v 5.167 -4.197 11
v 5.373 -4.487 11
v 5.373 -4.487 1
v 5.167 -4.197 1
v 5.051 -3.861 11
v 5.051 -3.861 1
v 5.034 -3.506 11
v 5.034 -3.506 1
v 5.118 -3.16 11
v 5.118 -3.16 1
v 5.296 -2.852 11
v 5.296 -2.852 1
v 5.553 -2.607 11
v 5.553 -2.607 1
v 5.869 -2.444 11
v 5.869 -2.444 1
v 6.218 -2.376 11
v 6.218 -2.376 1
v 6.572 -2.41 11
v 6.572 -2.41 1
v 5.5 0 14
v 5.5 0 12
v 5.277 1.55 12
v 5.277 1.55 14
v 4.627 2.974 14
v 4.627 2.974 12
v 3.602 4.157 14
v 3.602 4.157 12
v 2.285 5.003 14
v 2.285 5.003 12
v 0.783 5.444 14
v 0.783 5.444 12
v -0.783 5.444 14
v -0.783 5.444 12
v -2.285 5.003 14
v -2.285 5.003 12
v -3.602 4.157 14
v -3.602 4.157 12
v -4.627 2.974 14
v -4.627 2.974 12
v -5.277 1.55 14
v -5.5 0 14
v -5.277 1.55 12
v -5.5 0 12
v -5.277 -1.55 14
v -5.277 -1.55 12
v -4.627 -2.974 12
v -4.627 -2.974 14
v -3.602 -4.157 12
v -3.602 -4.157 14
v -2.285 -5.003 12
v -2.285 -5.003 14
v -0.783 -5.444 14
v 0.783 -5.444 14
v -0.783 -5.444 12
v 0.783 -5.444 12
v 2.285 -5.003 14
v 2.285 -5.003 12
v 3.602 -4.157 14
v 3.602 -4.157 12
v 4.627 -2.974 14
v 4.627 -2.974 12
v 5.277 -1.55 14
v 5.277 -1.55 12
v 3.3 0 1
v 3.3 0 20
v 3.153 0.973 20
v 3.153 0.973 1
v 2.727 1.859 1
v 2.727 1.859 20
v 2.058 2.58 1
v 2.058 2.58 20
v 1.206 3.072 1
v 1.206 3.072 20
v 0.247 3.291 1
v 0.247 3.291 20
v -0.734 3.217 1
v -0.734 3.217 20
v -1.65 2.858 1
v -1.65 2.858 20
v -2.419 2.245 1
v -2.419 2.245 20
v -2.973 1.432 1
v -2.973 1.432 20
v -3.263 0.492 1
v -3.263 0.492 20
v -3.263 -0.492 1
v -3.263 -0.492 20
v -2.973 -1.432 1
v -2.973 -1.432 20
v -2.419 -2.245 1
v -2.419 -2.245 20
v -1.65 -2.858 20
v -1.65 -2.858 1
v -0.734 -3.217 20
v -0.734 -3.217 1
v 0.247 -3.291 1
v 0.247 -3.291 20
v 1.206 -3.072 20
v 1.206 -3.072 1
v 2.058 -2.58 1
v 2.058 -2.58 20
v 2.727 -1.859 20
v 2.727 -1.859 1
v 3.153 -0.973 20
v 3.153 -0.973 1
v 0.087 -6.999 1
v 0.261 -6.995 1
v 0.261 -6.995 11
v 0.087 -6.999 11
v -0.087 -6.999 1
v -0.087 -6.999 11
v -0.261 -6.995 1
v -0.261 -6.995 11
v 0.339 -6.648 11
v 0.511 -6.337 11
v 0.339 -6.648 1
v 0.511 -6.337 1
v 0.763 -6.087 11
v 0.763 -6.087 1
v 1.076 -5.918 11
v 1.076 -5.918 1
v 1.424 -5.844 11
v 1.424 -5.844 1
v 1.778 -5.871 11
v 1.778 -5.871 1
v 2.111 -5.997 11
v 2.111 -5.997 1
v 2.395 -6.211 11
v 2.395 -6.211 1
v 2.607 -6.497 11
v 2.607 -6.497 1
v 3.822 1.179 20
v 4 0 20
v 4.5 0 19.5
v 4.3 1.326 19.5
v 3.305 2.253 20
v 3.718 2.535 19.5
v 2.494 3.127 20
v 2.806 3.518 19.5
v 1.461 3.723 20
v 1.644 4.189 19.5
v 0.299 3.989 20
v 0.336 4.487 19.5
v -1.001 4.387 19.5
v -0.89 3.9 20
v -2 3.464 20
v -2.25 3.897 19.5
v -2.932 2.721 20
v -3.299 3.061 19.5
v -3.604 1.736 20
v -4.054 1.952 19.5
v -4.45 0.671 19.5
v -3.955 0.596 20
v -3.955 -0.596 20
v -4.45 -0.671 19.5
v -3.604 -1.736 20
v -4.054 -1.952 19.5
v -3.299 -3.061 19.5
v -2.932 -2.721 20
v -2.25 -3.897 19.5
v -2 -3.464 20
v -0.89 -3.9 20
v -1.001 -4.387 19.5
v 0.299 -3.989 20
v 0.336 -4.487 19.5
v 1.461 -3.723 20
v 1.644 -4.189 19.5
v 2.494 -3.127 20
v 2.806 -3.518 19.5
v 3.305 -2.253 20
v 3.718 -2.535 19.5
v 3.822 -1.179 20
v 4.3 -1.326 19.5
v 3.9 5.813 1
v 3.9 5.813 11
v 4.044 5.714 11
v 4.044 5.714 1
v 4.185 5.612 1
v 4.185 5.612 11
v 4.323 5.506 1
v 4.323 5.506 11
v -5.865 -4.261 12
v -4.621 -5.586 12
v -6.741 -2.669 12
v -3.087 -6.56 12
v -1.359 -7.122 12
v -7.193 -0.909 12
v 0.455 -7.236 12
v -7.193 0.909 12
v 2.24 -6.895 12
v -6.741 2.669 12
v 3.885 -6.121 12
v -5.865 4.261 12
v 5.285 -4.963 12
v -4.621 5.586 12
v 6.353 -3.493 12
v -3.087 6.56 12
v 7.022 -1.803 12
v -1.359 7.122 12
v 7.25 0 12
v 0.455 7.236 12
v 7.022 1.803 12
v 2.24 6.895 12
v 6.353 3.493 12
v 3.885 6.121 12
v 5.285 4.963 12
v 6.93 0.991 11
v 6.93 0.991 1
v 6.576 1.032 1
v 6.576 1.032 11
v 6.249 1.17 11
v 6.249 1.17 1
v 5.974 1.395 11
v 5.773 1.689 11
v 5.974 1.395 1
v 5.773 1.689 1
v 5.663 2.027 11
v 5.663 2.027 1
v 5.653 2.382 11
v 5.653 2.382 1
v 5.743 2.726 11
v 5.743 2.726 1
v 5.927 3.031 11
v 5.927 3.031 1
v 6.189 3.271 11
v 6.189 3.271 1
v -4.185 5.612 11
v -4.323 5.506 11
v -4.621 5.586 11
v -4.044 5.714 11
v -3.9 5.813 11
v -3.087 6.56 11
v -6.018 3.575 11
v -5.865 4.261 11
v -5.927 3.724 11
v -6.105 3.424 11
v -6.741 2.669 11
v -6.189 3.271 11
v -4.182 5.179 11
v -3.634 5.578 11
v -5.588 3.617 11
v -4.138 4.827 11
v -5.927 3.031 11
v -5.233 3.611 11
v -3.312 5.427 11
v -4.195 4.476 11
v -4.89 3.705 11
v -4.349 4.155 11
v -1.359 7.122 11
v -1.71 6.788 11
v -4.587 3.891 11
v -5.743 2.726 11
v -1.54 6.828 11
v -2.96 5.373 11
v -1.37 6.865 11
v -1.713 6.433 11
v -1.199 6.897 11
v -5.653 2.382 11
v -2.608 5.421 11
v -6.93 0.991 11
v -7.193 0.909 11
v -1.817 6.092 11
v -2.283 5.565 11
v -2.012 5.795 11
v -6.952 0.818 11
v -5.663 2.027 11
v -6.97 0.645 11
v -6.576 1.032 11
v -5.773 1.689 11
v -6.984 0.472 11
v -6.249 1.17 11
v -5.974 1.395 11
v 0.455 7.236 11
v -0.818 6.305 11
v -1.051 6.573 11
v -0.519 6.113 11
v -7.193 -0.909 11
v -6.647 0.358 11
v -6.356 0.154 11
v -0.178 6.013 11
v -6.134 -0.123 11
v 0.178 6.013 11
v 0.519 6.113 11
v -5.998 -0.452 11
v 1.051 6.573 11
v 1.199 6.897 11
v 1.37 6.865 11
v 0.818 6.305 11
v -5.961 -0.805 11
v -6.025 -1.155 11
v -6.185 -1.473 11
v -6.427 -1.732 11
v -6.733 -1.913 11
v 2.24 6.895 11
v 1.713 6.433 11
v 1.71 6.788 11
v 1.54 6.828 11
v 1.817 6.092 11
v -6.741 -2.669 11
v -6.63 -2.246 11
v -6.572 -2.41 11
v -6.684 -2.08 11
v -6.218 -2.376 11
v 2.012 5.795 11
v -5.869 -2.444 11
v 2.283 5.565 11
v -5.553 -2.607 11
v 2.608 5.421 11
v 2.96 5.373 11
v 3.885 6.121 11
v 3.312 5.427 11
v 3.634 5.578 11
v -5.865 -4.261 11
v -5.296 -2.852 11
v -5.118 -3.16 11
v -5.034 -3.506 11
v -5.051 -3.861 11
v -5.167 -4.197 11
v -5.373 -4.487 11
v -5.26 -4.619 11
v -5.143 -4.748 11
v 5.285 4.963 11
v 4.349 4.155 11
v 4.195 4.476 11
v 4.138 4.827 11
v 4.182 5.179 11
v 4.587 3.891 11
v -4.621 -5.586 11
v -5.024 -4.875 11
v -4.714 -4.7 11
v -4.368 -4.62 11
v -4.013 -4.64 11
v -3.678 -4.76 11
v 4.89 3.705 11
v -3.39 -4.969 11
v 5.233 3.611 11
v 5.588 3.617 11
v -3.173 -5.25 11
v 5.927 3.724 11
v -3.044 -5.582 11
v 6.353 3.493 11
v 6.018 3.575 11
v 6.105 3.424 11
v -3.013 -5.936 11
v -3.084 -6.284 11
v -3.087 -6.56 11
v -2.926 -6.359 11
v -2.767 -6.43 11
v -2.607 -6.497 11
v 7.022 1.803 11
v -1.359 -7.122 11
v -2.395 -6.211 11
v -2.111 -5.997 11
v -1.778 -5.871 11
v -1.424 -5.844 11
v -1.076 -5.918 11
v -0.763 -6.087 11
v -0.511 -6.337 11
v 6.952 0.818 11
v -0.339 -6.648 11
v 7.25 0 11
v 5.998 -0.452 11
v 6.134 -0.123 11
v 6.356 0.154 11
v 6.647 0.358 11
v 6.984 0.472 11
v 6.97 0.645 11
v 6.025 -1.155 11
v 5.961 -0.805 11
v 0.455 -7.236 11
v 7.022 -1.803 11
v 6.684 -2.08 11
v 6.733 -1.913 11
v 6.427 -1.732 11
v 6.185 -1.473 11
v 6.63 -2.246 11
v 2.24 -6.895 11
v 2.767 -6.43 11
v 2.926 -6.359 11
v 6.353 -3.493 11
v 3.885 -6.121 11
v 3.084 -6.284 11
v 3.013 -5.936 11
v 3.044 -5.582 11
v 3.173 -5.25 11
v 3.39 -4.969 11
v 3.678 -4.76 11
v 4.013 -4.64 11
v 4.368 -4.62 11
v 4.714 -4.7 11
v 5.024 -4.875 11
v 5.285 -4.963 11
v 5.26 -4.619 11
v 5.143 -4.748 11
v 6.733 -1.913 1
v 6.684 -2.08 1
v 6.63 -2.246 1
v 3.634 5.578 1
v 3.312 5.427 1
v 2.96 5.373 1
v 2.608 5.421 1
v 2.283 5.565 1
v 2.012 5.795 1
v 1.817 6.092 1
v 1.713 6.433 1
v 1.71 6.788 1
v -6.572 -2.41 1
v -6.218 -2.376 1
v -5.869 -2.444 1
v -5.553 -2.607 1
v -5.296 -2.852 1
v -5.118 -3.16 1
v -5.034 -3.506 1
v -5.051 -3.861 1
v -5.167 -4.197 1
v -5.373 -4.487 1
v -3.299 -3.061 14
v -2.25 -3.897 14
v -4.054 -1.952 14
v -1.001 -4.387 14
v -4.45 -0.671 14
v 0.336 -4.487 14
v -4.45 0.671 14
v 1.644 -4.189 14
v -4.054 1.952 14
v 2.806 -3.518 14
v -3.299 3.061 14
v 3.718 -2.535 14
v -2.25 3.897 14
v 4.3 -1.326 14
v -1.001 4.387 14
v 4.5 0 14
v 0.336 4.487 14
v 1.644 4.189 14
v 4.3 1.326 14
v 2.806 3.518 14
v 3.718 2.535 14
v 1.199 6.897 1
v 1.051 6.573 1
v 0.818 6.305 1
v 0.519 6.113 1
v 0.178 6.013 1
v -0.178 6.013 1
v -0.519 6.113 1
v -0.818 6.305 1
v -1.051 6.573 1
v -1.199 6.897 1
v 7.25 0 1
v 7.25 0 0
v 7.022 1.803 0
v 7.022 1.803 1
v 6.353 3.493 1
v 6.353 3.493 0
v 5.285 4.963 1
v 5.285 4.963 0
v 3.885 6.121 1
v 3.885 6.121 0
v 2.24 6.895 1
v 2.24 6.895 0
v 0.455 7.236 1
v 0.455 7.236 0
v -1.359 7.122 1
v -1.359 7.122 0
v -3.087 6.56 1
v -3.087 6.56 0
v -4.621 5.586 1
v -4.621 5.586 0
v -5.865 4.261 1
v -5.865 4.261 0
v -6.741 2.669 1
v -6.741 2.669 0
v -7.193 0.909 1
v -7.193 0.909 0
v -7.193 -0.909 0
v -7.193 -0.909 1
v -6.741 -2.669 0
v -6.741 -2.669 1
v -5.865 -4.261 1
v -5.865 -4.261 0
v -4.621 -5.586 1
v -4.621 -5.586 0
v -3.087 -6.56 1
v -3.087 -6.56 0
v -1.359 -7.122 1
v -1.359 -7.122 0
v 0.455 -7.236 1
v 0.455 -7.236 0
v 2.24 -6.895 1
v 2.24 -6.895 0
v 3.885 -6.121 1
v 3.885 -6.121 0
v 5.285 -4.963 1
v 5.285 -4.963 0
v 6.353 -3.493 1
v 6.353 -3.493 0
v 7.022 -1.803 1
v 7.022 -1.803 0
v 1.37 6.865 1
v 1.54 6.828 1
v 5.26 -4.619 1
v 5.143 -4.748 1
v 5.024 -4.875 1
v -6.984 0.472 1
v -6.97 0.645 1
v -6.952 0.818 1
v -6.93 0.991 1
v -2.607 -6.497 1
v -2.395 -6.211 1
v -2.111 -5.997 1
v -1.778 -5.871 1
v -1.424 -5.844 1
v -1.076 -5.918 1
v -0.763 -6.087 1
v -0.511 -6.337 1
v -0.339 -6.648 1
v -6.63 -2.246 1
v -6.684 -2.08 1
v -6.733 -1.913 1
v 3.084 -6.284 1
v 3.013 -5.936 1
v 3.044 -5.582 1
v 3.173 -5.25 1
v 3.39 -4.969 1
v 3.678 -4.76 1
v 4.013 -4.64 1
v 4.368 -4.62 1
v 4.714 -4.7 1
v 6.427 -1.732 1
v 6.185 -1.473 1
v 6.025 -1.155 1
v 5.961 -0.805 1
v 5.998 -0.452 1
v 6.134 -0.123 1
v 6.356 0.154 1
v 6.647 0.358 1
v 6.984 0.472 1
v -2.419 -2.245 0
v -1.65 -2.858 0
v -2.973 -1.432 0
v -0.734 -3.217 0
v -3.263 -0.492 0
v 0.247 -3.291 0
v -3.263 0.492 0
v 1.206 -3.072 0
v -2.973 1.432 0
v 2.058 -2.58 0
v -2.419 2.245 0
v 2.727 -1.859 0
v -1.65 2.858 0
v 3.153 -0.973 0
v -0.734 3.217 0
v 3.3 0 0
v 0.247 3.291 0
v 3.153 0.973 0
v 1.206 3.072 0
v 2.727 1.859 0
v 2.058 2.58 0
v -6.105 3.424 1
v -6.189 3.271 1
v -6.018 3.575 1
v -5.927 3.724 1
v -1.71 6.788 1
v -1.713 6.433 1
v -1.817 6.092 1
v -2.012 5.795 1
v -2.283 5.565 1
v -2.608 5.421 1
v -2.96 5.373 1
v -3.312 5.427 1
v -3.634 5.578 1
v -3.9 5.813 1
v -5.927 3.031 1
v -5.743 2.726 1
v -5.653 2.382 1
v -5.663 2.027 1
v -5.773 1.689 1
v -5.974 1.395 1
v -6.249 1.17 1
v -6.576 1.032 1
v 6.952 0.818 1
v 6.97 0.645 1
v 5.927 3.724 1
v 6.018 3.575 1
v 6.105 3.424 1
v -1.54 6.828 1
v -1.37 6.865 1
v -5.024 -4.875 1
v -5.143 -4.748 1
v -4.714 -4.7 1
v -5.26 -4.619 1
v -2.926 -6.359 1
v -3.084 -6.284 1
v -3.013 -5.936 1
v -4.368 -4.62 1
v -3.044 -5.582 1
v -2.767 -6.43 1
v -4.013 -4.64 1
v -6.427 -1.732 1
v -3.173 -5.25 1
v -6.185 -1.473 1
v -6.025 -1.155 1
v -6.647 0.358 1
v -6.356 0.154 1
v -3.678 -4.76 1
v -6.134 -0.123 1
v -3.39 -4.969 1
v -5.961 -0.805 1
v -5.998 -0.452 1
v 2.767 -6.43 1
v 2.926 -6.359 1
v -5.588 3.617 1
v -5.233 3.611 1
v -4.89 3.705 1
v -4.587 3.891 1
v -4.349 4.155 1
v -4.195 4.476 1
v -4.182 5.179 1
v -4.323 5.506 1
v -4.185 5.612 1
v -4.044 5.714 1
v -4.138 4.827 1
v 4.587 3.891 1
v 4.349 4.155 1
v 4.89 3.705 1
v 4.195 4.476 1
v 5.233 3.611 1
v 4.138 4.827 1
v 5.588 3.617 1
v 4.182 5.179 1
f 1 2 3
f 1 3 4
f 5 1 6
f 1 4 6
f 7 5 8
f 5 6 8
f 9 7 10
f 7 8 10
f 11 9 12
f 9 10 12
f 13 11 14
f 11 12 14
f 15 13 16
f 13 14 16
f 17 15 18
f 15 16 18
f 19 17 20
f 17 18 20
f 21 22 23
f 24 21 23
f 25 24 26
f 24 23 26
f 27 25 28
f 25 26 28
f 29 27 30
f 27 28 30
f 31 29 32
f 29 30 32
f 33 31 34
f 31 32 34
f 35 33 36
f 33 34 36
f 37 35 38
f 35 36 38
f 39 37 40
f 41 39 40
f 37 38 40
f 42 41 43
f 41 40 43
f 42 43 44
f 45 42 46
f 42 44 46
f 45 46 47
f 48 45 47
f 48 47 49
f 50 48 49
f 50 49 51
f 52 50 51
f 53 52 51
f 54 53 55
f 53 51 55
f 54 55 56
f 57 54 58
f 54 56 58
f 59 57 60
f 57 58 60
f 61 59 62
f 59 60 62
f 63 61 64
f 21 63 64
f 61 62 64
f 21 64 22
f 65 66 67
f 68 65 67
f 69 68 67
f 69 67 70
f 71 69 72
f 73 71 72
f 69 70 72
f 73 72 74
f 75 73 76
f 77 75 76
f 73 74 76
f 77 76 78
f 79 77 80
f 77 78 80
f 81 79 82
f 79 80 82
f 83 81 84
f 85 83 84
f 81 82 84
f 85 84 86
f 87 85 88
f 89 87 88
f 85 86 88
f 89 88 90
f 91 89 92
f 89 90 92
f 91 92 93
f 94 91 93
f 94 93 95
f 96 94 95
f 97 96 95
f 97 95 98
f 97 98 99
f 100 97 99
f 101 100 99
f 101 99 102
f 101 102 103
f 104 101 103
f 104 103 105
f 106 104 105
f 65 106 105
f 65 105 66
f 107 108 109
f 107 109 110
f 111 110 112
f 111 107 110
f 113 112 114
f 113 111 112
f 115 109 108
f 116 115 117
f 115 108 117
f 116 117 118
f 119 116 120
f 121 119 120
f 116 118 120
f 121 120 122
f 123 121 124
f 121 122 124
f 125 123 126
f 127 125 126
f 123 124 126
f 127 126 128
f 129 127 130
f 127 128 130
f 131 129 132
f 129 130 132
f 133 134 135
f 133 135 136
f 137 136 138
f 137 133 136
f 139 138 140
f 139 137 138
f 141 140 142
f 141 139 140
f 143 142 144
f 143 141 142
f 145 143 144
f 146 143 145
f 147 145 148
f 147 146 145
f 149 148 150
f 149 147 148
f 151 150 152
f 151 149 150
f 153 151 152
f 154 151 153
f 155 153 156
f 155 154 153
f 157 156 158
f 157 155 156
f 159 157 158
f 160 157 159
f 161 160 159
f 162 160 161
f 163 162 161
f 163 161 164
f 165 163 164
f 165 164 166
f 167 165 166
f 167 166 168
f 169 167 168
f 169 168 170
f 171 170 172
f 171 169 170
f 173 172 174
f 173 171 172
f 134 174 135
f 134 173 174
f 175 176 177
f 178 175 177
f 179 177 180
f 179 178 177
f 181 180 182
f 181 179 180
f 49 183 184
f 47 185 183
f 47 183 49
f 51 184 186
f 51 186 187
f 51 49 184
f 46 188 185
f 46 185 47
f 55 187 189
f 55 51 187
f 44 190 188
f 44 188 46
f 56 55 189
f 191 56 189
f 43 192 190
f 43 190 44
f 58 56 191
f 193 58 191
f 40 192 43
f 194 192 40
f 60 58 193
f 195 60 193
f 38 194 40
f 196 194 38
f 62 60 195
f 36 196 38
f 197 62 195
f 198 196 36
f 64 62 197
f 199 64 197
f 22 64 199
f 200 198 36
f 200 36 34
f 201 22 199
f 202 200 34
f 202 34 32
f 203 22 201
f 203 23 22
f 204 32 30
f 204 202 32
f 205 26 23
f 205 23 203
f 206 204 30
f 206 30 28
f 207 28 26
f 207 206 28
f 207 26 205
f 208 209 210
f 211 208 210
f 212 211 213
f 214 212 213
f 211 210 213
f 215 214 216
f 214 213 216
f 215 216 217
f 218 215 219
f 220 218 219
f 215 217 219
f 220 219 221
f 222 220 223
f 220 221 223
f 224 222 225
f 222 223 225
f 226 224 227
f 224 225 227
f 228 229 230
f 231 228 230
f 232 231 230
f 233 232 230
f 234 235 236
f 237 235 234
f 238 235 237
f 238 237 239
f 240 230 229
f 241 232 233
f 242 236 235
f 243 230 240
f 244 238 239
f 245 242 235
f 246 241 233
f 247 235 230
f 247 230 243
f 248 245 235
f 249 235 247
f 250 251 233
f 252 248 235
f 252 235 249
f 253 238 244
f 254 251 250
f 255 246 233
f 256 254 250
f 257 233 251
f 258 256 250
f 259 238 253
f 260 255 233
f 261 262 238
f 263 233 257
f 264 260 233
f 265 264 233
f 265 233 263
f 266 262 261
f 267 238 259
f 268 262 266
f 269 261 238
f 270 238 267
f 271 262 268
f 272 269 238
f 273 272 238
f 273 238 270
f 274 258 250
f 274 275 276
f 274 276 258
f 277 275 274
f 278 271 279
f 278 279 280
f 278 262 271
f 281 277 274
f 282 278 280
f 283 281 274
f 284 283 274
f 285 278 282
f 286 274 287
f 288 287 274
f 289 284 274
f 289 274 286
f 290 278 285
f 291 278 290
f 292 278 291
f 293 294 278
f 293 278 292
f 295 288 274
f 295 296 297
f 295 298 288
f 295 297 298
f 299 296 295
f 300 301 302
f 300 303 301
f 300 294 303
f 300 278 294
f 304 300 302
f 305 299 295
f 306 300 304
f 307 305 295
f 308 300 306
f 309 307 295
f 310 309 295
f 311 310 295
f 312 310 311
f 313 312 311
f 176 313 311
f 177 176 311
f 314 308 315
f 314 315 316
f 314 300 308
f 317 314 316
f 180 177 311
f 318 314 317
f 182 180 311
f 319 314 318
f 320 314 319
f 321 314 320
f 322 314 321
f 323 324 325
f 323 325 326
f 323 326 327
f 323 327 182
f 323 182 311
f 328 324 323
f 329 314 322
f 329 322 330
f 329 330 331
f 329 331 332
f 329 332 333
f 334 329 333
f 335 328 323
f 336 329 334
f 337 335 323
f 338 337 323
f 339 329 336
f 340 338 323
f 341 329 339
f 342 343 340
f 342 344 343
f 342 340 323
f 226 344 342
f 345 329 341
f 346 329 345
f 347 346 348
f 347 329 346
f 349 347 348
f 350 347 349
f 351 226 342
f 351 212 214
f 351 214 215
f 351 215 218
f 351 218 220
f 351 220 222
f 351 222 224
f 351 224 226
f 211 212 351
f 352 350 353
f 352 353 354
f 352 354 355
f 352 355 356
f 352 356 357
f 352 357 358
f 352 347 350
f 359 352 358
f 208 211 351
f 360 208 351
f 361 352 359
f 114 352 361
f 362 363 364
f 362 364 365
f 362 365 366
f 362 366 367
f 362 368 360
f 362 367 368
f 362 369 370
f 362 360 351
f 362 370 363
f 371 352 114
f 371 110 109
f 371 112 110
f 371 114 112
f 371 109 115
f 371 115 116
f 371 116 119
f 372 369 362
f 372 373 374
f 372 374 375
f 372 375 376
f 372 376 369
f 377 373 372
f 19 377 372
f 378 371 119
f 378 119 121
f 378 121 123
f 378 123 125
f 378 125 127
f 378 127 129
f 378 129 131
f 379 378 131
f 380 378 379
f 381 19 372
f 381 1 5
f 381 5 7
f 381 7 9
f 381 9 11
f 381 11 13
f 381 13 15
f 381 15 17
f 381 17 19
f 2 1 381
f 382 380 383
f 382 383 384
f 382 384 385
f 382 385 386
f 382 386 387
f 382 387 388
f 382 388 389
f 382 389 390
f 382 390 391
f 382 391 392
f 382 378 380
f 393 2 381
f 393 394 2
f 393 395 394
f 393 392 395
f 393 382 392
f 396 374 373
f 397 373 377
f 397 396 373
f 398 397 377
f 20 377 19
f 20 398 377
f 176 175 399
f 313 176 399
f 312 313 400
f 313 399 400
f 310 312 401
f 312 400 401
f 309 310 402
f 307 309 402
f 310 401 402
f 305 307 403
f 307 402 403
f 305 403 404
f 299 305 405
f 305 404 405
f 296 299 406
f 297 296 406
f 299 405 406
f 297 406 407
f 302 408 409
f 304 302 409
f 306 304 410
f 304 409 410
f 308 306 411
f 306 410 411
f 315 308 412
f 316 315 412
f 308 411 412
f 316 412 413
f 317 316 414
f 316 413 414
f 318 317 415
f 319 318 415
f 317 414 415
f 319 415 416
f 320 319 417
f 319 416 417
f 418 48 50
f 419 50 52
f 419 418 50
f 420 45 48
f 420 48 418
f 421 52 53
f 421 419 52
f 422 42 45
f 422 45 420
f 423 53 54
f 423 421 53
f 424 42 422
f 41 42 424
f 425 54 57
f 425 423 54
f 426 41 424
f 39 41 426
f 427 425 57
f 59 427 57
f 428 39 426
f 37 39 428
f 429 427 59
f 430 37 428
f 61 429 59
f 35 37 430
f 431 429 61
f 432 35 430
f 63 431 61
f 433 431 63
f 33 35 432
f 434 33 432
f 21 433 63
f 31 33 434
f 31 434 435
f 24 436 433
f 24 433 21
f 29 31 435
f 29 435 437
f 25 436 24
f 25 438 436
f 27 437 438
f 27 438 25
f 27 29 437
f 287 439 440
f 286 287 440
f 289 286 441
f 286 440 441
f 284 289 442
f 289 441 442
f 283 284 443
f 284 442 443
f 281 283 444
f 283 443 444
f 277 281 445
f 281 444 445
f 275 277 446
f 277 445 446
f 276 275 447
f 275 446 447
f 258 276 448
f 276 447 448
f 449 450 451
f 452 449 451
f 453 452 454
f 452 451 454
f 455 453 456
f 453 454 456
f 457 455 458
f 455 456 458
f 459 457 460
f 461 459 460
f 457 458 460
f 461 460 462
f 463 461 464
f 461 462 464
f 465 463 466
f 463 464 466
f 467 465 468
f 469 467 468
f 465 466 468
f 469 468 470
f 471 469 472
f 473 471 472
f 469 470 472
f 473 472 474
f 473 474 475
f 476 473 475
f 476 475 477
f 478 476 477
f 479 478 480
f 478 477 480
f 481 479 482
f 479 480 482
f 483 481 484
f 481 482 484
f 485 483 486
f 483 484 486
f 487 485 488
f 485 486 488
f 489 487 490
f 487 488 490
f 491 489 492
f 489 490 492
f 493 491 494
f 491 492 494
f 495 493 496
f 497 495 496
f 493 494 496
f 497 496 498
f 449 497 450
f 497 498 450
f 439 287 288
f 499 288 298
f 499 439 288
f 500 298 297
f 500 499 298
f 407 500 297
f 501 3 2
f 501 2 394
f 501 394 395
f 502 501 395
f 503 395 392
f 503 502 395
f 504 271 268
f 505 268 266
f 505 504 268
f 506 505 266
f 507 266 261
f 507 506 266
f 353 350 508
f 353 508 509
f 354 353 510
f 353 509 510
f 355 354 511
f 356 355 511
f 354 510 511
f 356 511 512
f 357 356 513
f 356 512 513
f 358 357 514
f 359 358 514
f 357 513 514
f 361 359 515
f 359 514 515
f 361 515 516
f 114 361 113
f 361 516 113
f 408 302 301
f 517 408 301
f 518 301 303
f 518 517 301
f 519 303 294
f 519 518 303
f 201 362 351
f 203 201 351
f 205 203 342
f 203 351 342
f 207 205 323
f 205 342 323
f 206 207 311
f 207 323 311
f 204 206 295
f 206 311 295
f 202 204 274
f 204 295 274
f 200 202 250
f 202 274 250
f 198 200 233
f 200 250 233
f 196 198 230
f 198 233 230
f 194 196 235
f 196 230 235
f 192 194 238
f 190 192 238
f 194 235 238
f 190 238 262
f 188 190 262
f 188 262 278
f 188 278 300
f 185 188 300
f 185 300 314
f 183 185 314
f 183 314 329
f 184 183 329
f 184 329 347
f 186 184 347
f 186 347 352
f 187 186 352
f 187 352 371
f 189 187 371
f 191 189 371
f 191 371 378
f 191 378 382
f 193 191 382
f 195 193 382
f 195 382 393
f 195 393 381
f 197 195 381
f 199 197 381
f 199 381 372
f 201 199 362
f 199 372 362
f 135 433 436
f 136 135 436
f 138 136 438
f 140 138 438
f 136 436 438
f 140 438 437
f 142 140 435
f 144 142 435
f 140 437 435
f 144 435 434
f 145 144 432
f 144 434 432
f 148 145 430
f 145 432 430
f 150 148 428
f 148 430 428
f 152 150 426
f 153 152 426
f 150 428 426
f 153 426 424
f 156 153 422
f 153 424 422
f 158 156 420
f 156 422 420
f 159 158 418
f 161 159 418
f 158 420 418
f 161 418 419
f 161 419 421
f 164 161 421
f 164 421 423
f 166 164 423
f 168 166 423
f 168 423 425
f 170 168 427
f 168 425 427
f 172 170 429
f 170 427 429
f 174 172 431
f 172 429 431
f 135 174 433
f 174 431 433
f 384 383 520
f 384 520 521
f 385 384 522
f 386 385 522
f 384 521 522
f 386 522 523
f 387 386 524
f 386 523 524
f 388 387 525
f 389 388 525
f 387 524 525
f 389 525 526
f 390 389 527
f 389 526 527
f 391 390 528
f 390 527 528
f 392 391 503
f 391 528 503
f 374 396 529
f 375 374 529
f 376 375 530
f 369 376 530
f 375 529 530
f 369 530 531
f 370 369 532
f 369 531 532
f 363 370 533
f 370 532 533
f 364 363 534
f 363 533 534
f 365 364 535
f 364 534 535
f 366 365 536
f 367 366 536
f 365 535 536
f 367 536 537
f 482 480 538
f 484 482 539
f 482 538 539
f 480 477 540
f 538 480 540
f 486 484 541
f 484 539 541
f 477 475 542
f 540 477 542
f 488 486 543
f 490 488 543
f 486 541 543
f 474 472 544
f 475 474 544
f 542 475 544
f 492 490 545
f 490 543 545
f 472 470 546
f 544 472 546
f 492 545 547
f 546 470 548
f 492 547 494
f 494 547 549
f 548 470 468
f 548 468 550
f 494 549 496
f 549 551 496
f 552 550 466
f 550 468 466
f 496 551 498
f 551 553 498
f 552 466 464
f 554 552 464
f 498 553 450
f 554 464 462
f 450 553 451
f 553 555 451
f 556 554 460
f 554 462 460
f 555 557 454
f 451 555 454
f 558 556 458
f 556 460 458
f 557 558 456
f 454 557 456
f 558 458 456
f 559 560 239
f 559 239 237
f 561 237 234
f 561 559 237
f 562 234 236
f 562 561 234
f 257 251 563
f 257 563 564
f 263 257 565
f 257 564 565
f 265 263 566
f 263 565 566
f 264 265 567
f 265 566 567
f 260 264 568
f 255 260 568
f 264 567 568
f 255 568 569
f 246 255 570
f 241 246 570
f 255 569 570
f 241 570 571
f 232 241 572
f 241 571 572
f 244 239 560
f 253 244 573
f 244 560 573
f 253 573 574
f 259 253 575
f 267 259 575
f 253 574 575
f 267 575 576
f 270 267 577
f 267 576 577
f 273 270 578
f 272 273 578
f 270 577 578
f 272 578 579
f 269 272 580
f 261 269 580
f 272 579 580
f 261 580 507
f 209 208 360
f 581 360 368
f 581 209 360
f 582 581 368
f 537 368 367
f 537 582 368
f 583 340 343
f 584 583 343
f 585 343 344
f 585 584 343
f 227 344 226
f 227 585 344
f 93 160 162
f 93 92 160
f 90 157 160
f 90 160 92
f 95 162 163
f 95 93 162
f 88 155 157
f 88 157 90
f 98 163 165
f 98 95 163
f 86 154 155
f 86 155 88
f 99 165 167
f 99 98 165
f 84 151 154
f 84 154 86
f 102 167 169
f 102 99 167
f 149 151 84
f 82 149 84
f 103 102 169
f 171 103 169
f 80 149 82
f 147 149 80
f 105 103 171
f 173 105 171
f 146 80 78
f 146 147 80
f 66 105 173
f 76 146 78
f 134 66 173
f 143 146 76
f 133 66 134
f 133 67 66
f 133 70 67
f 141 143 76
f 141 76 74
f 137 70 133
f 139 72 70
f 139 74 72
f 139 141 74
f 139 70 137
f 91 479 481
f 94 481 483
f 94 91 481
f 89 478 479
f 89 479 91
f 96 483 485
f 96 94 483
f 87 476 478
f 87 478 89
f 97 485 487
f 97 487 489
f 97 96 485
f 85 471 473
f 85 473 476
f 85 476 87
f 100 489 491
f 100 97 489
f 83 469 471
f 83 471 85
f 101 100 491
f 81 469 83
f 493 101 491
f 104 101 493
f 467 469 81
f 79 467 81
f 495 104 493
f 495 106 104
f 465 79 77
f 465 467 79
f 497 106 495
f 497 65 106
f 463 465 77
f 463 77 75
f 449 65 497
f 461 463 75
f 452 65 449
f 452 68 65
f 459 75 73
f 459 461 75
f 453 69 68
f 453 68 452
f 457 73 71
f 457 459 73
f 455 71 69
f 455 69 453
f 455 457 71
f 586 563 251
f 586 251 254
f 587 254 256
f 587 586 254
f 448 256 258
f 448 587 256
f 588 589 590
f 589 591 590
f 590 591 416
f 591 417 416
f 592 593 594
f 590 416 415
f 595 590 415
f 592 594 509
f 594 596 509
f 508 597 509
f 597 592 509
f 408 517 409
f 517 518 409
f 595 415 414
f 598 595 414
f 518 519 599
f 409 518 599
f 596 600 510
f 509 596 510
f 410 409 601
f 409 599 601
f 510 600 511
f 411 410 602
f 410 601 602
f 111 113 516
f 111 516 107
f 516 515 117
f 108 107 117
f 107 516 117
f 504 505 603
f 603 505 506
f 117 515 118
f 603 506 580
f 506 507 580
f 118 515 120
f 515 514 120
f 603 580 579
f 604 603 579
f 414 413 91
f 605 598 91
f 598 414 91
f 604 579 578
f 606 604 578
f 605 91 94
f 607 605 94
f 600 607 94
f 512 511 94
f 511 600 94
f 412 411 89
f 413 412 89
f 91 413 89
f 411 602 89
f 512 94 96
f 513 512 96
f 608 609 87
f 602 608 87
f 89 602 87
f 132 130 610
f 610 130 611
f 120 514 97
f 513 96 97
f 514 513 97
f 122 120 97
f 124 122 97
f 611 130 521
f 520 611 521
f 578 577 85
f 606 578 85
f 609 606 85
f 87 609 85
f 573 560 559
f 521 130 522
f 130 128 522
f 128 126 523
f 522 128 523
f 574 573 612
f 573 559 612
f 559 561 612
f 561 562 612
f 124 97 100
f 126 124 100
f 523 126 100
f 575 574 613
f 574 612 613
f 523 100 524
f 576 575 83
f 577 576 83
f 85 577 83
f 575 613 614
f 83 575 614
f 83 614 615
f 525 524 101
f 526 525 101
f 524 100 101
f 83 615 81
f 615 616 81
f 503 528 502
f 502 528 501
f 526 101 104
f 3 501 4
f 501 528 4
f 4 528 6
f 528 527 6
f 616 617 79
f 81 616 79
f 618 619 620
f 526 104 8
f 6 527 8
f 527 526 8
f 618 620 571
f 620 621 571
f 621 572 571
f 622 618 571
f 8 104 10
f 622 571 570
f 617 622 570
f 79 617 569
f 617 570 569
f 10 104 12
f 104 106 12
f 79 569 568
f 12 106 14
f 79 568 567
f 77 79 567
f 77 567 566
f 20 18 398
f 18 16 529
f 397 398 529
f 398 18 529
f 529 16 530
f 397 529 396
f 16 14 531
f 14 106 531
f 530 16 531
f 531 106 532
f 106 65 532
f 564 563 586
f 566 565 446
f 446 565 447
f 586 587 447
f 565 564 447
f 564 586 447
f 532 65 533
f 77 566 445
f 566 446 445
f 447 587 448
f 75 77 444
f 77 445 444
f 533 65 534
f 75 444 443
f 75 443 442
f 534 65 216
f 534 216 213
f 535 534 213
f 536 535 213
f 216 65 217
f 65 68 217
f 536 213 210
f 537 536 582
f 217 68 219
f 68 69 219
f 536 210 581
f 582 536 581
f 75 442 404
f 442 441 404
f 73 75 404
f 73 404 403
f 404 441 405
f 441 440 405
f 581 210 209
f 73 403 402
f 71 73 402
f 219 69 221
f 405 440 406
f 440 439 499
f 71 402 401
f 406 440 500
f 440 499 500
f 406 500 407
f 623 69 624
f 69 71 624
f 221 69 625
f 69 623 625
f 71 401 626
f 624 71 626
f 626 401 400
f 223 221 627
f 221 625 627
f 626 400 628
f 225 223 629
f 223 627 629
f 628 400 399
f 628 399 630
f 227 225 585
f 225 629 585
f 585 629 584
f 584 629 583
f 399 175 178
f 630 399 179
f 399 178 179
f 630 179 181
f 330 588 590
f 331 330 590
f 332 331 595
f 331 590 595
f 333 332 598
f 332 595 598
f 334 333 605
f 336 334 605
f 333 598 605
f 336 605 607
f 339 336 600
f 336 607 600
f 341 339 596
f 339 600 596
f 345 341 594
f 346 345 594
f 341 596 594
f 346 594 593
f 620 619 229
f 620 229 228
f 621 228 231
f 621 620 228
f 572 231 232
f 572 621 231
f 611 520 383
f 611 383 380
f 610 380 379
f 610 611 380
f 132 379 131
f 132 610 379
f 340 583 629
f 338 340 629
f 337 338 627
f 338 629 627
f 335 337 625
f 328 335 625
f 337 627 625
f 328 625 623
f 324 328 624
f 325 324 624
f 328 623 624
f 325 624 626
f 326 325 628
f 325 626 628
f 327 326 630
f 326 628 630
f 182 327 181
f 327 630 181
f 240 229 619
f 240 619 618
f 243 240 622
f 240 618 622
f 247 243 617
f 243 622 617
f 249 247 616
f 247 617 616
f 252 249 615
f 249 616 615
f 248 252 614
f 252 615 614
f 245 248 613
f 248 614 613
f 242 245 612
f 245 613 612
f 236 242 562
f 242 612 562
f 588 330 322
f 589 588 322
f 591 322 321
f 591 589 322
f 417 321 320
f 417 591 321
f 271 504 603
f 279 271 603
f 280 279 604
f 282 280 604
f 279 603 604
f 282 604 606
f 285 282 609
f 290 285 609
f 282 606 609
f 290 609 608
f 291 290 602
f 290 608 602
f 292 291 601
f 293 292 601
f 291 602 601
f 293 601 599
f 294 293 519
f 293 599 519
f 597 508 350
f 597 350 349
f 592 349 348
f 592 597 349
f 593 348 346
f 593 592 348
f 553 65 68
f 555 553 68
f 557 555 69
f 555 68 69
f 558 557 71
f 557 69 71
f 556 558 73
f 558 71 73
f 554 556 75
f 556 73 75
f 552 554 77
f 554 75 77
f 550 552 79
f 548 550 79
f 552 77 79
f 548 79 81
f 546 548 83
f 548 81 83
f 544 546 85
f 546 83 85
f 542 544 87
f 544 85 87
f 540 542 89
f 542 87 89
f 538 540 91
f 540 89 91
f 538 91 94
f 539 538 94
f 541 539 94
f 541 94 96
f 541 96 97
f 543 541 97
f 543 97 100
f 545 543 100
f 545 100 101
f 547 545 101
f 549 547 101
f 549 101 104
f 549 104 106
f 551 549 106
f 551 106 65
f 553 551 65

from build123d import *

# Parameters (mm, degrees)
F0_R            = 7.25
F1_DEPTH        = 1
F2_R            = 7.25
F3_DEPTH        = 11
F4_R            = 1.25
F5_DEPTH        = 10
F5_COPIES_COUNT = 15
F6_R            = 7.25
F6_R_2          = 7
F7_DEPTH        = 10
F8_R            = 5.5
F9_DEPTH        = 2
F10_R           = 4.5
F11_DEPTH       = 6
F12_R           = 3.3
F13_DEPTH       = 25
F14_SIZE        = 0.5


# Not quite as in the source:
# - a pattern or mirror of a feature is missing from the dataset's text; its kind, count and spacing are read off the source's solid


with BuildPart() as f1:
    # F0 (on Top) → F1 (new body)
    with BuildSketch(Plane.XY):
        Circle(F0_R)
    extrude(amount=F1_DEPTH)


with BuildPart() as f3:
    # F2 (on face) → F3 (new body)
    with BuildSketch(Plane.XY.offset(1)):
        Circle(F2_R)
    extrude(amount=F3_DEPTH)

    # F4 (on face) → F5 (cut)
    with BuildSketch(Plane(origin=(0, 0, 1), x_dir=(1, 0, 0), z_dir=(0, 0, -1))):
        with Locations((0, -7.25)):
            Circle(F4_R)
    f5 = extrude(amount=-F5_DEPTH, mode=Mode.SUBTRACT)

    # F5_copies: F5 ×15 about axis
    f5_copies_axis = Axis((0, 0, 0), (0, 0, 1))
    for i in range(1, F5_COPIES_COUNT):
        add(f5.rotate(f5_copies_axis, i * 360 / F5_COPIES_COUNT), mode=Mode.SUBTRACT)

    # F6 (on face) → F7 (cut)
    with BuildSketch(Plane(origin=(0, 0, 1), x_dir=(1, 0, 0), z_dir=(0, 0, -1))):
        Circle(F6_R)
        Circle(F6_R_2, mode=Mode.SUBTRACT)
    extrude(amount=-F7_DEPTH, mode=Mode.SUBTRACT)

    # F8 (on face) → F9 (join)
    with BuildSketch(Plane.XY.offset(12)):
        Circle(F8_R)
    extrude(amount=F9_DEPTH)

    # F10 (on face) → F11 (join)
    with BuildSketch(Plane.XY.offset(14)):
        Circle(F10_R)
    extrude(amount=F11_DEPTH)


with BuildPart() as f13_tool:
    # F12 (on face) → F13 (new body)
    with BuildSketch(Plane.XY.offset(20)):
        Circle(F12_R)
    extrude(amount=-F13_DEPTH)


with BuildPart() as f1_1:
    add(f1.part)

    # F13: cut by f13_tool
    add(f13_tool.part, mode=Mode.SUBTRACT)


with BuildPart() as f3_1:
    add(f3.part)

    # F13: cut by f13_tool
    add(f13_tool.part, mode=Mode.SUBTRACT)

    # F14
    f14_edges = [f3_1.edges().sort_by_distance(p)[0] for p in [
        (-4.5, 0, 20),
    ]]
    chamfer(f14_edges, length=F14_SIZE)


solid = Compound([f1_1.part, f3_1.part])
